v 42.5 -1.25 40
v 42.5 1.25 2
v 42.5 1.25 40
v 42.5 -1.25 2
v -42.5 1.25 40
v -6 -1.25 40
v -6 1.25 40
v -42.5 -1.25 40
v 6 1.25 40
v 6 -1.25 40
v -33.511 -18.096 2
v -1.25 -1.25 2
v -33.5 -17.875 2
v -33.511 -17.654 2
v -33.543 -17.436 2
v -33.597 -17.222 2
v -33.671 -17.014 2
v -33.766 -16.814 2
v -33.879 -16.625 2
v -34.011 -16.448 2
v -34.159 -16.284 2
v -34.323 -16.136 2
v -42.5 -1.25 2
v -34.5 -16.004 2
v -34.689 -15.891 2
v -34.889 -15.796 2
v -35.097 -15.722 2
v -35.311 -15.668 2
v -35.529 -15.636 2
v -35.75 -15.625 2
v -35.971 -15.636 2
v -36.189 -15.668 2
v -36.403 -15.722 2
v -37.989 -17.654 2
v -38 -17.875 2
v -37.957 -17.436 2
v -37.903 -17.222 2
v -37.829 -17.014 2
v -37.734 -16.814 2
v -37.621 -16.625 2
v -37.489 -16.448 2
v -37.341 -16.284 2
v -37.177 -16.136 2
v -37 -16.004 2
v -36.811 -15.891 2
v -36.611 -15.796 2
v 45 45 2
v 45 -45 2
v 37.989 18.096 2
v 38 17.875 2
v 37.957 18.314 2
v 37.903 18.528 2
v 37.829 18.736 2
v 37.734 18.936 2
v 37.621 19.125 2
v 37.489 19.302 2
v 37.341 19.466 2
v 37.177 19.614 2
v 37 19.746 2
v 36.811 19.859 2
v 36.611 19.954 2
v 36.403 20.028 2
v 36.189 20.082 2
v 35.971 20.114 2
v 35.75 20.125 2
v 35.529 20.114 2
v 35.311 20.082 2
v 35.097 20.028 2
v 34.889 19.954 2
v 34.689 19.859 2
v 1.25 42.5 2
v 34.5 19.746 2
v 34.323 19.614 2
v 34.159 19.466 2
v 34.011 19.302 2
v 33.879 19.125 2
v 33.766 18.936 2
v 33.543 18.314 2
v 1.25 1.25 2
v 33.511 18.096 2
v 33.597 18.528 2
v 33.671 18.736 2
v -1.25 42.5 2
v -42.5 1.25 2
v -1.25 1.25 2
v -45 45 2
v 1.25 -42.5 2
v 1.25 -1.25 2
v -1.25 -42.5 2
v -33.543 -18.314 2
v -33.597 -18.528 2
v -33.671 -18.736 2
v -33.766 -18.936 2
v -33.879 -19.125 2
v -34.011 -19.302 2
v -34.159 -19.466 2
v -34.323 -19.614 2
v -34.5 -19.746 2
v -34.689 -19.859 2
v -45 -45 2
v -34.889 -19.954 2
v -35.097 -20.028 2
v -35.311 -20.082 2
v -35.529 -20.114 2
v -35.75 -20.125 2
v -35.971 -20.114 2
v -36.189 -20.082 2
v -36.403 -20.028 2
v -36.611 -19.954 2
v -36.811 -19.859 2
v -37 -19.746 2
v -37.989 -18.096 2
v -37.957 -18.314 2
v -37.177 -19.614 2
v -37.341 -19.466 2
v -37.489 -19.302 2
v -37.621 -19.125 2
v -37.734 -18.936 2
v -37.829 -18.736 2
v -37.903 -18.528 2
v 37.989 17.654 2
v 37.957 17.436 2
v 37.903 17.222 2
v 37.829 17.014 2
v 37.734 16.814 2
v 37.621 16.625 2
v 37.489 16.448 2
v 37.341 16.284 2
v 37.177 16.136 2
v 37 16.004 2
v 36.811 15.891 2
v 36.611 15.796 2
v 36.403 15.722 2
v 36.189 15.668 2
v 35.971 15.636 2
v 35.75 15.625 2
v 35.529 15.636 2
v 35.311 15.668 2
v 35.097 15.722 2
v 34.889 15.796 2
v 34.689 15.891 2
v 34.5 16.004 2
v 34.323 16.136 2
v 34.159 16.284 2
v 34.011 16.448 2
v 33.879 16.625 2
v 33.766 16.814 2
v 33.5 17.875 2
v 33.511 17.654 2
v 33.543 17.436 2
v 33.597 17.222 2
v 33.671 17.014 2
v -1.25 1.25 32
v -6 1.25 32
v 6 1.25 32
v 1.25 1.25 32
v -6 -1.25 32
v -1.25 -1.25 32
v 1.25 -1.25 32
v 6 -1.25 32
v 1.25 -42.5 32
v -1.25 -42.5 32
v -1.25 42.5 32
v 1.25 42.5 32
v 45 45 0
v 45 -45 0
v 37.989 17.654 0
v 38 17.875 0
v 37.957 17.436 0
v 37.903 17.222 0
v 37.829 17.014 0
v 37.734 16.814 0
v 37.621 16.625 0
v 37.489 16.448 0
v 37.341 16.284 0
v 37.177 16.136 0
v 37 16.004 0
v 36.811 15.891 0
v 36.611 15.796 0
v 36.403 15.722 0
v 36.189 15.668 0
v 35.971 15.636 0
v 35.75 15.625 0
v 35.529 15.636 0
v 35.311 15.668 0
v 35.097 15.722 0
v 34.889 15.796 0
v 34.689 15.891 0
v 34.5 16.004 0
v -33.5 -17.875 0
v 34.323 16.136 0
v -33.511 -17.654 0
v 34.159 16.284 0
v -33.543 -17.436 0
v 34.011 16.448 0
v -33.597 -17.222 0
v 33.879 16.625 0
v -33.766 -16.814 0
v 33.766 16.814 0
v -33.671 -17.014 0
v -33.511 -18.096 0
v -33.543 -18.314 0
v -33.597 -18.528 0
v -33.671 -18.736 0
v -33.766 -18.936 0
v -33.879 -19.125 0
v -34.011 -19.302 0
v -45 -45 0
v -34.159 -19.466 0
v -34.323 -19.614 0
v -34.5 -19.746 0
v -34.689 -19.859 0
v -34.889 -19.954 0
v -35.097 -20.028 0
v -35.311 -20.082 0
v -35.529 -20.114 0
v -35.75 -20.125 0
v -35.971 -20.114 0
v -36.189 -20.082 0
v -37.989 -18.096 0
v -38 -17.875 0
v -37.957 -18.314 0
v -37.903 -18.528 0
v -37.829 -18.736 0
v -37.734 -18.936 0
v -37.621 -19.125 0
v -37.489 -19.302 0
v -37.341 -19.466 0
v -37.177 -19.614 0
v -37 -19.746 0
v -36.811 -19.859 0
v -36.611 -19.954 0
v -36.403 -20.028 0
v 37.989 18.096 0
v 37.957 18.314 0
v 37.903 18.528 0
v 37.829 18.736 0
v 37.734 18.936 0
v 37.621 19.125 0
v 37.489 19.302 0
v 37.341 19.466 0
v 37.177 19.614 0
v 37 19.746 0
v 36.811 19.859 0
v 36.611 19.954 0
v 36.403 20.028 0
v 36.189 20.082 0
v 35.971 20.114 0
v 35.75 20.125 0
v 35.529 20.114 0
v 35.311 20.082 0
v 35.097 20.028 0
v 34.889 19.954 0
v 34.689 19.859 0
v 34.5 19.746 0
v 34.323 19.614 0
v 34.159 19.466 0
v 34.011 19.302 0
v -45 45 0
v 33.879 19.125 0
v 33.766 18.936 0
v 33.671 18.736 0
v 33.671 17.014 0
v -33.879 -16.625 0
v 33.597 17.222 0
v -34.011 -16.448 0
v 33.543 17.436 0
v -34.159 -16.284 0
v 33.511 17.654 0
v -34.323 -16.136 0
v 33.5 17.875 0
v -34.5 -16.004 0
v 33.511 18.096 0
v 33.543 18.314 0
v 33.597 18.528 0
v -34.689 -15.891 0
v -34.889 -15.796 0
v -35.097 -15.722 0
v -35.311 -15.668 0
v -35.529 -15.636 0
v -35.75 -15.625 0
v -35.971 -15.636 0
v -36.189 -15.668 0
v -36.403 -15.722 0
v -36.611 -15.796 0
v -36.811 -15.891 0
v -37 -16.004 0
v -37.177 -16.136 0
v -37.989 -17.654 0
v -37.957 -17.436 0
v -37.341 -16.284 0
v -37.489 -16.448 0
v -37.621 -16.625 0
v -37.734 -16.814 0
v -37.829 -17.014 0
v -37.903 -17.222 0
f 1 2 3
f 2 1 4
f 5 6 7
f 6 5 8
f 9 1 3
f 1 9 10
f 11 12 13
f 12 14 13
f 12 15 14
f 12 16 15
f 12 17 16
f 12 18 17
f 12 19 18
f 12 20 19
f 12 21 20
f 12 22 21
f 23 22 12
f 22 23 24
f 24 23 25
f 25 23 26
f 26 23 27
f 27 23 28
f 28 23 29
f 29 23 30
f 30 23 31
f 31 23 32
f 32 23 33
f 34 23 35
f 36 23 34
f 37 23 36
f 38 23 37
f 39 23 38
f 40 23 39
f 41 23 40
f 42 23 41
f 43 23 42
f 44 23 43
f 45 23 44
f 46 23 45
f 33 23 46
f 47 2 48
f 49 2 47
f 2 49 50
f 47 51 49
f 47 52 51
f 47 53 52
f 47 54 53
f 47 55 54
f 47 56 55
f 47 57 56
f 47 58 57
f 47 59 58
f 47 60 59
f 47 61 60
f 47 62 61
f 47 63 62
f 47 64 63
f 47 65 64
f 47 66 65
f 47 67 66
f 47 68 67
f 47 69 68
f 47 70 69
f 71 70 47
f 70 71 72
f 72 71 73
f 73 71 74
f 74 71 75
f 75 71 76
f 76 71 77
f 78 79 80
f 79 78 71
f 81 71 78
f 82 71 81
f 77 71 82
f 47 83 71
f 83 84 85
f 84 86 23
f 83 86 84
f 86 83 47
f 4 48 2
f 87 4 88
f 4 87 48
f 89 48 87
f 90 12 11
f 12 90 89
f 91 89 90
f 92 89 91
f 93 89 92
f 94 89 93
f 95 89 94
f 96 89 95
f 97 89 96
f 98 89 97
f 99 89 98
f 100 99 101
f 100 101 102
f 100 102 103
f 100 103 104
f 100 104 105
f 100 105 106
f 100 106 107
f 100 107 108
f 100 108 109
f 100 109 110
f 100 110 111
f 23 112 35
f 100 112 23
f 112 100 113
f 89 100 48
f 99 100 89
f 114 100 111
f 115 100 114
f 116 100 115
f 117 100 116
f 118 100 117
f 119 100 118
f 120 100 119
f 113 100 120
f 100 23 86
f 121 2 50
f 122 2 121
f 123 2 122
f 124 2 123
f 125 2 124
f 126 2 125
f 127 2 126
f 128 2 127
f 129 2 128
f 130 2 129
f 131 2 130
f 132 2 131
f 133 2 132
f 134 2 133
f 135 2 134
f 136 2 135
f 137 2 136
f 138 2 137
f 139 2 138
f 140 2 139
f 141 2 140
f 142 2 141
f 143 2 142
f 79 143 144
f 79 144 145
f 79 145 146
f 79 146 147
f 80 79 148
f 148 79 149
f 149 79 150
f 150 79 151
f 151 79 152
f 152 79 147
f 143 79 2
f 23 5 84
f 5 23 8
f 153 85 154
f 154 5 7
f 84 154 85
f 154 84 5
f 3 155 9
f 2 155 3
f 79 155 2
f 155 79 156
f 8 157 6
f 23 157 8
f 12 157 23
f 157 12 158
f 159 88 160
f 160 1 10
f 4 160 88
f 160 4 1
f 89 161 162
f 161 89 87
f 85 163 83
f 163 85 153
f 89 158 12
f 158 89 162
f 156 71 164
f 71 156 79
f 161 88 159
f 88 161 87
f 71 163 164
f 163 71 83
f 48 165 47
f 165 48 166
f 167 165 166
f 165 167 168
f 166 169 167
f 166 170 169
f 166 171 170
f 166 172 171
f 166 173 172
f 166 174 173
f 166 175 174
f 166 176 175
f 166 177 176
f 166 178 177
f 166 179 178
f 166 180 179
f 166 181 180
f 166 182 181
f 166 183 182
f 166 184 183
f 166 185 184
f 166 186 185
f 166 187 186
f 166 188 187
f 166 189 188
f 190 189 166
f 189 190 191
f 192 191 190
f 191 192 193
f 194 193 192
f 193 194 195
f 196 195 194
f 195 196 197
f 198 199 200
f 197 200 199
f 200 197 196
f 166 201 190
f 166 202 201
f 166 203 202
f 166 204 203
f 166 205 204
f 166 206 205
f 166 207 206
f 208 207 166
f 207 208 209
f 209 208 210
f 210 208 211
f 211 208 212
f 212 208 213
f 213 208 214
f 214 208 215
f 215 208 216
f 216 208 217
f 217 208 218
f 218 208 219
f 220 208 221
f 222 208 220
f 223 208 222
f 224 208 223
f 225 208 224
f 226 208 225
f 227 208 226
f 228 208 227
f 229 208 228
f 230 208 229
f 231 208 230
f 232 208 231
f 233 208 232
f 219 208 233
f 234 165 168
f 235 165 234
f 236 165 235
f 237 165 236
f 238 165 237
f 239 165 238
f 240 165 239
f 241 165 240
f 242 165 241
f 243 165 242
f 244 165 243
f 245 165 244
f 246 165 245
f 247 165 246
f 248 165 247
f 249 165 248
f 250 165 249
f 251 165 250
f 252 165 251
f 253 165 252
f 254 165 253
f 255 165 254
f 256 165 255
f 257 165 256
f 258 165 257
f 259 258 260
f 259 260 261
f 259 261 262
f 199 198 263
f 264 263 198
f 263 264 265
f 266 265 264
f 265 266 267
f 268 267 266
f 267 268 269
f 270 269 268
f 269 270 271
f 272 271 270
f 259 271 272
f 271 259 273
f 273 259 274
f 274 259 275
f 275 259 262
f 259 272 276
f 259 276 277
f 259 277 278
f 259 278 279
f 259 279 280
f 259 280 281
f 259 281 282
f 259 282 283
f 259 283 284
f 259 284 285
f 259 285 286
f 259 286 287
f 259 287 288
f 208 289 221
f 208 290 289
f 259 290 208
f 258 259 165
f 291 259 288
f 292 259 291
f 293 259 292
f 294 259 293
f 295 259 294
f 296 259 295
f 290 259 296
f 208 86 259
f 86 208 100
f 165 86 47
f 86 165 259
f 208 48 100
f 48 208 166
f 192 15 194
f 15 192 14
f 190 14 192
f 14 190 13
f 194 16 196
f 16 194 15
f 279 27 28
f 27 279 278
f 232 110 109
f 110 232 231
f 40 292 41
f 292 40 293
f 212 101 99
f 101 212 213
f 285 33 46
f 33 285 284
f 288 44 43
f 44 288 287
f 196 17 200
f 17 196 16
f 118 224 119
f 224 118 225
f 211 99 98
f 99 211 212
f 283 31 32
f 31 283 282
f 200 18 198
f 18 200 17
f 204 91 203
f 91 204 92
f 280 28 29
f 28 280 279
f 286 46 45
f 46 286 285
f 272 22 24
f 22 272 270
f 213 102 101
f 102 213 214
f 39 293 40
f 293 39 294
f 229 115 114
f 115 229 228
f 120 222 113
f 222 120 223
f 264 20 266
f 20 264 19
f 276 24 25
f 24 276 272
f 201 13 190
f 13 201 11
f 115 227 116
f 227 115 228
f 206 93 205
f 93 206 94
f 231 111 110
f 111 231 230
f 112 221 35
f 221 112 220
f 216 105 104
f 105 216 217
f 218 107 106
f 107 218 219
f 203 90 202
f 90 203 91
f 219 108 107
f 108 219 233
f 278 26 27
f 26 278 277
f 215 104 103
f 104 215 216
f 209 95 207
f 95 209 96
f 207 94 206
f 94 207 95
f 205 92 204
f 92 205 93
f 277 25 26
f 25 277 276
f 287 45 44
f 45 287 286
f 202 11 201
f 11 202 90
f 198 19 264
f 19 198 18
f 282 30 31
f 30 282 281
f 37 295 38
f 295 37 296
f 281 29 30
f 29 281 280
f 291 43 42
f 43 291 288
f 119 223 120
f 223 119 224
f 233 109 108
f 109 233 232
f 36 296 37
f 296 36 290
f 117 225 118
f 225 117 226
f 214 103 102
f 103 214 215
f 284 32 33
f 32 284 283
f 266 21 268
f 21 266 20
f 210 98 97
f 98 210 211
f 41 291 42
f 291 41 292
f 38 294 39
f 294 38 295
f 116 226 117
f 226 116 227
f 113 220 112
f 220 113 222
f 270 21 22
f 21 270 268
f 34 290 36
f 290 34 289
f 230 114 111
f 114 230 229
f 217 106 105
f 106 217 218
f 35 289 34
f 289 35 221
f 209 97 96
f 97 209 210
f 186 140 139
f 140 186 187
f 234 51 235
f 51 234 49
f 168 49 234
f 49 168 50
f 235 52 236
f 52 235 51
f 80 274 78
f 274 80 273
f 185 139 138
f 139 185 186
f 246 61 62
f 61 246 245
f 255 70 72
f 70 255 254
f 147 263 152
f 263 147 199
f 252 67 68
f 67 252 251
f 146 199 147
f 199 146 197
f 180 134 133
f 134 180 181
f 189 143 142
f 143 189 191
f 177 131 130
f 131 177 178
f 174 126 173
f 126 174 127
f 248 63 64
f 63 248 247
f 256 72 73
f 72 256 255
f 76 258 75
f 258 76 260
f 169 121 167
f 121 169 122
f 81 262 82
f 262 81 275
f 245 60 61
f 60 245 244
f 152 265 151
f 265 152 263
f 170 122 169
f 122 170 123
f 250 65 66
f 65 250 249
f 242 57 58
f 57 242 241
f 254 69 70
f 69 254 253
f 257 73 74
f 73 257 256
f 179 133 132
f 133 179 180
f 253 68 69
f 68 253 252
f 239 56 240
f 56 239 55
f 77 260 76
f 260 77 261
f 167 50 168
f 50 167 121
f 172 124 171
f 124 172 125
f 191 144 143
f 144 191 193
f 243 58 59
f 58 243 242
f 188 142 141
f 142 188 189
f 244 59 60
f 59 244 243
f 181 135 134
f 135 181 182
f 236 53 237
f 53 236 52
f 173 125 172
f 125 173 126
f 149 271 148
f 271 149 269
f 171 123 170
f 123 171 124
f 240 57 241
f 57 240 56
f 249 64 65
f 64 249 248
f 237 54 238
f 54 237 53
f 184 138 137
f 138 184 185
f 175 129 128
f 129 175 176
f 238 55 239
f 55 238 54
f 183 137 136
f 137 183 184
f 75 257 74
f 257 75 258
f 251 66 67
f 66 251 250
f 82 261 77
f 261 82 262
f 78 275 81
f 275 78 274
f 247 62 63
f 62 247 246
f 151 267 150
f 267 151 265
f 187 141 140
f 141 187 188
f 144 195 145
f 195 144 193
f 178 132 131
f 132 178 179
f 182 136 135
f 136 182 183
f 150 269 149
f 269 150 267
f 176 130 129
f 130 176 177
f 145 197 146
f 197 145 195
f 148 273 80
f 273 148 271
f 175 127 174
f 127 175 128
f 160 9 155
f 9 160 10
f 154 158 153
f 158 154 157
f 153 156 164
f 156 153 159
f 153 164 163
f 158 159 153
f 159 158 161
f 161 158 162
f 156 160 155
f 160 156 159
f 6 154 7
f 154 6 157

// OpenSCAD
// DIY magnetic stirrer housing for 80 mm PC case fan
// Print orientation: top plate on bed (z = 0), open box upward (+Z)

// ---------------- Parameters ----------------
outer_size    = 90;    // outer size of top plate and box (X x Y)
plate_thick   = 2;     // top plate thickness (z = 0 to 2)
wall_thick    = 2.5;   // wall thickness (z = 2 to 40)
box_height    = 40;    // overall height of box (z = 0 to 40)

screw_d       = 4.5;   // M4 screw hole diameter
screw_pitch   = 71.5;  // square pattern centre-to-centre spacing
screw_count   = 4;     // number of screw holes

notch_width   = 12;    // power cable notch width
notch_depth   = 8;     // notch depth from open edge (z = 32 to 40)

eps           = 0.5;   // cutter overshoot past faces
$fn           = 64;    // curve resolution

// ---------------- Derived ----------------
total_thick   = plate_thick + wall_thick;   // 4.5 mm bottom + walls
notch_z0      = box_height - notch_depth;   // z = 32 (notch floor)

// ---------------- Model ----------------
difference() {
    union() {
        // Top plate (lies on the bed)
        translate([-outer_size/2, -outer_size/2, 0])
            cube([outer_size, outer_size, plate_thick]);

        // Four walls rising from the plate to the open top
        for (a = [0, 90, 180, 270])
            rotate([0, 0, a])
                translate([-(outer_size/2 - wall_thick),
                           -wall_thick/2,
                           plate_thick])
                    cube([outer_size - 2*wall_thick,
                          wall_thick,
                          box_height - plate_thick]);
    }

    // Screw holes through the top plate on a centred square pattern
    for (i = [0 : screw_count - 1]) {
        x = (i % 2 - 0.5) * screw_pitch;
        y = (i / 2 - 0.25) * screw_pitch;
        translate([x, y, -eps])
            cylinder(d = screw_d, h = plate_thick + 2*eps);
    }

    // Power cable notch in one wall (z = 32 to 40)
    translate([-notch_width/2, -outer_size/2, notch_z0])
        cube([notch_width, outer_size + 2*eps, notch_depth + eps]);
}
